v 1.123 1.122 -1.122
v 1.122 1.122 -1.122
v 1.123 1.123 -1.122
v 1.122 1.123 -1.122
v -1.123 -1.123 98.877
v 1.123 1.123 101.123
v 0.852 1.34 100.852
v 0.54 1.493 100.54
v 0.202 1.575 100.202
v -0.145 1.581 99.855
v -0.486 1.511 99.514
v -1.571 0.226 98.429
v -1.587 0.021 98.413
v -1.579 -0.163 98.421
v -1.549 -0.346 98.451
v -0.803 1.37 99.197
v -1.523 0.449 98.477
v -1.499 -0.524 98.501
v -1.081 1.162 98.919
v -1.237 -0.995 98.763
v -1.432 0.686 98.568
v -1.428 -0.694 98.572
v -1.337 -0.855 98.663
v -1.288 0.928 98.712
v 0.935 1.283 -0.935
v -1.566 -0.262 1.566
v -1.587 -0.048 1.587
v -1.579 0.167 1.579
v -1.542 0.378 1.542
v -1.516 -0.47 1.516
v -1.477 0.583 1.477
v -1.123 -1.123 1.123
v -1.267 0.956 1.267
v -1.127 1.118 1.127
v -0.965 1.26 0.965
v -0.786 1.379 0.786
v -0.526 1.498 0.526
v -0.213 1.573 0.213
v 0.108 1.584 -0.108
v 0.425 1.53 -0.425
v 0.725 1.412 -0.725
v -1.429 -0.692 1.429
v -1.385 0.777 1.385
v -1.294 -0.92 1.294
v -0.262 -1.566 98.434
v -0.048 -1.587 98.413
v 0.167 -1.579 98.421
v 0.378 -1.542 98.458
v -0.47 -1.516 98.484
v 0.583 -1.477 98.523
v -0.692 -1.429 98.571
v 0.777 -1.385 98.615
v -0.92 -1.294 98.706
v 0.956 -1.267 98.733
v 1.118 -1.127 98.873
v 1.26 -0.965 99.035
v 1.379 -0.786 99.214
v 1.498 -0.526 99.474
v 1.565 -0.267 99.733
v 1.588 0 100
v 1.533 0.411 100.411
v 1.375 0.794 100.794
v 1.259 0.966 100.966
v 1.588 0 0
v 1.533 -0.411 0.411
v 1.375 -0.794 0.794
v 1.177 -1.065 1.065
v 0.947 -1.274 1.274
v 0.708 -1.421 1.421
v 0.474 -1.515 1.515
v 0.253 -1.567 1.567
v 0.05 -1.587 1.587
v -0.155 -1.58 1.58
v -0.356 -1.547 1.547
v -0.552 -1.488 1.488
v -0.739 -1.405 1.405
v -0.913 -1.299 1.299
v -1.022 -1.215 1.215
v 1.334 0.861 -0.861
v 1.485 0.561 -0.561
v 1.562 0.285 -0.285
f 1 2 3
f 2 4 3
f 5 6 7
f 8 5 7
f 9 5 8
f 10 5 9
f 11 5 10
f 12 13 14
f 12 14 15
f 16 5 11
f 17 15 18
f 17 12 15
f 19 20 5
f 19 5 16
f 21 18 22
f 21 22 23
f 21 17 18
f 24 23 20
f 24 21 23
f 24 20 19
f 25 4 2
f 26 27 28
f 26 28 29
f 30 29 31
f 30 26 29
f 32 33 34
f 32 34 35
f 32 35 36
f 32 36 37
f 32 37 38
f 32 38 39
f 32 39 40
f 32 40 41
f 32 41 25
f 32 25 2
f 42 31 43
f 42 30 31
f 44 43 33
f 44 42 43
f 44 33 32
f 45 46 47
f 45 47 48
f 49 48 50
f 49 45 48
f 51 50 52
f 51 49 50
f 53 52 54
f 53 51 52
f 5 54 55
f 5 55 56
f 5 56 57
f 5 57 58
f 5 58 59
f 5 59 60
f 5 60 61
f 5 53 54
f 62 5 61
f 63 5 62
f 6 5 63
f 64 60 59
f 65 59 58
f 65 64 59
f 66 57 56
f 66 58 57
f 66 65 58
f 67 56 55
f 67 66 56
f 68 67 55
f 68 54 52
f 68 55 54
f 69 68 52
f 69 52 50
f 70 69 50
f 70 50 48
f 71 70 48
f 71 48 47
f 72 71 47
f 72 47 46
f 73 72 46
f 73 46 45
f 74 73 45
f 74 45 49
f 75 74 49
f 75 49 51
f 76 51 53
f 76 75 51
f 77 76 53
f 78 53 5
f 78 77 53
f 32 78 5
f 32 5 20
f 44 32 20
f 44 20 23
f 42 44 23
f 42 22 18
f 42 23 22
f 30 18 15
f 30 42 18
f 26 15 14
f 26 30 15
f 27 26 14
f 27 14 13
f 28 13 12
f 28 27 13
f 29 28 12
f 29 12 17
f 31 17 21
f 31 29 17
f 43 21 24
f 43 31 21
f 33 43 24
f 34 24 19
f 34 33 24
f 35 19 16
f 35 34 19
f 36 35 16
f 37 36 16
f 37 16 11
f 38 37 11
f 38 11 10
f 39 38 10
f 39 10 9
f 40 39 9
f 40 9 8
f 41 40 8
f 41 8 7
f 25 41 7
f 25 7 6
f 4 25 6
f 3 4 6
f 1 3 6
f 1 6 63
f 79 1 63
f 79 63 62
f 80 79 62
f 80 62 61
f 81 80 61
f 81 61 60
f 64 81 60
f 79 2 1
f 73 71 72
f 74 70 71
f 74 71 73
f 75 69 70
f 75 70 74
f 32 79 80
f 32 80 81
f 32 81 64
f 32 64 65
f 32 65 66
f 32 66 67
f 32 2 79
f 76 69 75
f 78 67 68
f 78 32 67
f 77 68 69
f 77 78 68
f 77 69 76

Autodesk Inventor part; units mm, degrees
ref_plane "Start Plane" through (0, 0, -1.1225) normal (0, 0, 1) x (1, 0, 0)
ref_plane "End Plane" through (0, 0, 101.1225) normal (0, 0, 1) x (1, 0, 0)
sketch "Sketch" plane through (0, 0, 0) normal (0, 0, 1) x (1, 0, 0)
  circle A0 centre (0, 0) radius 1.5875
  dimension "d0" = 3.175
extrude "Body" add sketch "Sketch" along normal up to surface (102.2451 mm away) from surface at -1.1225
sketch "Sketch2" plane through (0, 0, 0) normal (0, 0, 1) x (1, 0, 0)
  line L0 (0, 0) -> (10, 0)
ref_plane "Work Plane3" through (0, 0, 0) normal (0, -1, 0) x (1, 0, 0)
sketch "Sketch3" plane through (0, 0, 0) normal (0, -1, 0) x (1, 0, 0)
  line L0 (-2, -1.1225) -> (12, -1.1225)
  line L1 (-2, 101.1225) -> (12, 101.1225)
  dimension "d7" = 102.2451
ref_plane "Work Plane4" through (1.5875, 0, -1.5875) normal (-0.7071, 0, -0.7071) x (-0.7071, 0, 0.7071)
split "Split1" plane through (1.5875, 0, -1.5875) removes the side toward (-0.7071, 0, -0.7071)
ref_plane "Work Plane5" through (0, 1.5875, -1.5875) normal (0, -0.7071, -0.7071) x (1, 0, 0)
split "Split2" plane through (0, 1.5875, -1.5875) removes the side toward (0, -0.7071, -0.7071)
ref_plane "Work Plane6" through (1.5875, 0, 101.5875) normal (-0.7071, 0, 0.7071) x (0.7071, 0, 0.7071)
split "Split3" plane through (1.5875, 0, 101.5875) removes the side toward (-0.7071, 0, 0.7071)
ref_plane "Work Plane7" through (0, 1.5875, 101.5875) normal (0, -0.7071, 0.7071) x (1, 0, 0)
split "Split4" plane through (0, 1.5875, 101.5875) removes the side toward (0, -0.7071, 0.7071)
equation "\"d0\" = Diam"
equation "\"d1\" = G_L"
equation "\"Diam\" = 3.175"
equation "\"G_L\" = d7"
equation "\"G_OFFSET_START\" = 1.12253"
equation "\"G_OFFSET_END\" = 1.12253"
equation "\"d4\" = -G_OFFSET_START"
equation "\"d5\" = G_OFFSET_END + B_L"
equation "\"B_L\" = 100"
properties part number "ANSI/AISC Rolled Steel - 1/8-4,025, RB" material "Steel, Mild"
